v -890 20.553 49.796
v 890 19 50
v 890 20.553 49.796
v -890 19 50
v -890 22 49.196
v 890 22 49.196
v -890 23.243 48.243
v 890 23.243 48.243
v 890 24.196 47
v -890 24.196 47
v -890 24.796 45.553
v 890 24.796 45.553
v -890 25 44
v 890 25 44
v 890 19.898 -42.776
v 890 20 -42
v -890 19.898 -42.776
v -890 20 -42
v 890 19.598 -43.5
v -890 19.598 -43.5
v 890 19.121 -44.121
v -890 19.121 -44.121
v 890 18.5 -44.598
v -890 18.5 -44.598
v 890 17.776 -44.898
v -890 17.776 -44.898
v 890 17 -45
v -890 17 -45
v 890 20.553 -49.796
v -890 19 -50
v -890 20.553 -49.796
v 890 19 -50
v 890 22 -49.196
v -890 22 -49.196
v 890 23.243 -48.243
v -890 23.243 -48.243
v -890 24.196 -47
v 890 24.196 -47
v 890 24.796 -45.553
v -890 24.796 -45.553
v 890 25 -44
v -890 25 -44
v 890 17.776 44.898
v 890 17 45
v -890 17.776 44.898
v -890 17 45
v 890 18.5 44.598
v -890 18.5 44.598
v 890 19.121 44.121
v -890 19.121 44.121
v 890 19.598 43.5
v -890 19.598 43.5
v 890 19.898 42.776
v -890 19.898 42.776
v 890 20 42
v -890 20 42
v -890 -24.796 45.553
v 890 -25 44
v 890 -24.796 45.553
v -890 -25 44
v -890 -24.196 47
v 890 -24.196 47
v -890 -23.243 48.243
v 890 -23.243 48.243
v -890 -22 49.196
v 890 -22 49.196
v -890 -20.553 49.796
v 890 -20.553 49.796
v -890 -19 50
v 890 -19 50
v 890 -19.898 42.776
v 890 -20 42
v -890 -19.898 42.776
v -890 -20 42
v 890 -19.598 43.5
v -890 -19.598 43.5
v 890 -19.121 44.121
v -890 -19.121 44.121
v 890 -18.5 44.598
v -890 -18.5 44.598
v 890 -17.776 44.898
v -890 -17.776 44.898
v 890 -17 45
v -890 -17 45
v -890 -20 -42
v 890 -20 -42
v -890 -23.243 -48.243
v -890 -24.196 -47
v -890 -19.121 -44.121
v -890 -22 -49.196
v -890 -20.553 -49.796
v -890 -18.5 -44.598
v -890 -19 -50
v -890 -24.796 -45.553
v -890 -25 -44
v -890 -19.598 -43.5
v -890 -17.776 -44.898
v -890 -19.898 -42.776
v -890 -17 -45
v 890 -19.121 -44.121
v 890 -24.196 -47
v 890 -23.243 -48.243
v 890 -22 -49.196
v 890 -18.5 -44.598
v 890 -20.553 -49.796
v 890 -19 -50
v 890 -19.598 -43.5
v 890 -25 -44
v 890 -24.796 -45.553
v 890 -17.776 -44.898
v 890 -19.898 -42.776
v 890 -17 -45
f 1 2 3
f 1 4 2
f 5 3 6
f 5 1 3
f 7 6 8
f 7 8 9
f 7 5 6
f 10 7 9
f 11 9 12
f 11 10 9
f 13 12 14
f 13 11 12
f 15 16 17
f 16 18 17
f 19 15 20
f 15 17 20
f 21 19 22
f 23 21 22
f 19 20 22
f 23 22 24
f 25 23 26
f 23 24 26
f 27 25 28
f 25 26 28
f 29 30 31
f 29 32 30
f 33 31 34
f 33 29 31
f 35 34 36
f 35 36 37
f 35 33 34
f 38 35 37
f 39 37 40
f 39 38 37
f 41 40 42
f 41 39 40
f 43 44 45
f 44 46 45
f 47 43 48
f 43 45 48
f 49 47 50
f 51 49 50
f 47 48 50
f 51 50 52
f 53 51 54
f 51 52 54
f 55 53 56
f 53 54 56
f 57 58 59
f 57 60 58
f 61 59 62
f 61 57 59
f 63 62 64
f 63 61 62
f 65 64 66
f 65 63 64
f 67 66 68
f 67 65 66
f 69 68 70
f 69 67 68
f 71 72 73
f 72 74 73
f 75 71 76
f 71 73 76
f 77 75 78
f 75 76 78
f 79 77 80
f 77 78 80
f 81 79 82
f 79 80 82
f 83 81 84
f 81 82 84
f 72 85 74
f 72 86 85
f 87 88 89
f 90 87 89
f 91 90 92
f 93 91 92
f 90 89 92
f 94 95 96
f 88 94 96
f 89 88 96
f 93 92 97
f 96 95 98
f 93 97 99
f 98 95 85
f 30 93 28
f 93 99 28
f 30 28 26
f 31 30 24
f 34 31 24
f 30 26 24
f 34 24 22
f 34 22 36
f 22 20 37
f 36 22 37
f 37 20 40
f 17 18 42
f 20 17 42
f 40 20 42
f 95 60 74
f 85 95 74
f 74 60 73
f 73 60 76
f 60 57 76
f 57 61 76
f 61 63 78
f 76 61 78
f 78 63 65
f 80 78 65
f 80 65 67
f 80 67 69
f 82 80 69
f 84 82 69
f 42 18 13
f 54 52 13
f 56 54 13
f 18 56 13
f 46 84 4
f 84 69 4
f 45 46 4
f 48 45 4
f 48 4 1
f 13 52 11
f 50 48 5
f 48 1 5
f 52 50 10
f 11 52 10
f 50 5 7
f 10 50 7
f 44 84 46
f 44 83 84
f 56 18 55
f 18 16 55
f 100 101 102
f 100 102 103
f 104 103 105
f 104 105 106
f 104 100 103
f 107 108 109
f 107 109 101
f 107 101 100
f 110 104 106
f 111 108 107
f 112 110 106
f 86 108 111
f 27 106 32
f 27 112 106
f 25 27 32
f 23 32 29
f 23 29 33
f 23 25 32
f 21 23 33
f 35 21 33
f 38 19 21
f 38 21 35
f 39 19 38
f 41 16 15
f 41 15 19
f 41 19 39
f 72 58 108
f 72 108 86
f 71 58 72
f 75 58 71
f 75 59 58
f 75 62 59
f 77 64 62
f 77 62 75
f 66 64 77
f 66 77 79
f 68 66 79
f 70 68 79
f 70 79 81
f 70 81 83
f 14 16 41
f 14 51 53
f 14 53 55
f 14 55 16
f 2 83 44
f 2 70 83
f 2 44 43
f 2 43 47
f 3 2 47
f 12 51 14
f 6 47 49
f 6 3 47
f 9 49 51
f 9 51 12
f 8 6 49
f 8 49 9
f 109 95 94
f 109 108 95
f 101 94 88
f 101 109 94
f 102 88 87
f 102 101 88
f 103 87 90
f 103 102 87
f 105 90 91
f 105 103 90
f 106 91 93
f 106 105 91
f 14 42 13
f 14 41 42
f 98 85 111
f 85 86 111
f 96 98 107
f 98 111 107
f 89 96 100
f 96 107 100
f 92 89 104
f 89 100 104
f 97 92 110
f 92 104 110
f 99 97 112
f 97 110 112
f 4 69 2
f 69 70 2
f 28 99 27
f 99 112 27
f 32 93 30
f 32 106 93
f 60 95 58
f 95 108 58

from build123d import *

# Parameters (mm, degrees)
F0_W     = 50
F0_H     = 100
F0_W_2   = 40.000004
F0_H_2   = 90.000004
F1_DEPTH = 890
F2_R     = 3
F3_R     = 6


with BuildPart() as f1:
    # F0 (on Right) → F1 (new body, symmetric)
    with BuildSketch(Plane.YZ):
        Rectangle(F0_W, F0_H)
        Rectangle(F0_W_2, F0_H_2, mode=Mode.SUBTRACT)
    extrude(amount=F1_DEPTH, both=True)

    # F2
    f2_edges = [f1.edges().sort_by_distance(p)[0] for p in [
        (0, 20.000002, 45.000002),
        (0, 20.000002, -45.000002),
        (0, -20.000002, -45.000002),
        (0, -20.000002, 45.000002),
    ]]
    fillet(f2_edges, radius=F2_R)

    # F3
    f3_edges = [f1.edges().sort_by_distance(p)[0] for p in [
        (0, 25, -50),
        (0, 25, 50),
        (0, -25, 50),
        (0, -25, -50),
    ]]
    fillet(f3_edges, radius=F3_R)


solid = f1.part
